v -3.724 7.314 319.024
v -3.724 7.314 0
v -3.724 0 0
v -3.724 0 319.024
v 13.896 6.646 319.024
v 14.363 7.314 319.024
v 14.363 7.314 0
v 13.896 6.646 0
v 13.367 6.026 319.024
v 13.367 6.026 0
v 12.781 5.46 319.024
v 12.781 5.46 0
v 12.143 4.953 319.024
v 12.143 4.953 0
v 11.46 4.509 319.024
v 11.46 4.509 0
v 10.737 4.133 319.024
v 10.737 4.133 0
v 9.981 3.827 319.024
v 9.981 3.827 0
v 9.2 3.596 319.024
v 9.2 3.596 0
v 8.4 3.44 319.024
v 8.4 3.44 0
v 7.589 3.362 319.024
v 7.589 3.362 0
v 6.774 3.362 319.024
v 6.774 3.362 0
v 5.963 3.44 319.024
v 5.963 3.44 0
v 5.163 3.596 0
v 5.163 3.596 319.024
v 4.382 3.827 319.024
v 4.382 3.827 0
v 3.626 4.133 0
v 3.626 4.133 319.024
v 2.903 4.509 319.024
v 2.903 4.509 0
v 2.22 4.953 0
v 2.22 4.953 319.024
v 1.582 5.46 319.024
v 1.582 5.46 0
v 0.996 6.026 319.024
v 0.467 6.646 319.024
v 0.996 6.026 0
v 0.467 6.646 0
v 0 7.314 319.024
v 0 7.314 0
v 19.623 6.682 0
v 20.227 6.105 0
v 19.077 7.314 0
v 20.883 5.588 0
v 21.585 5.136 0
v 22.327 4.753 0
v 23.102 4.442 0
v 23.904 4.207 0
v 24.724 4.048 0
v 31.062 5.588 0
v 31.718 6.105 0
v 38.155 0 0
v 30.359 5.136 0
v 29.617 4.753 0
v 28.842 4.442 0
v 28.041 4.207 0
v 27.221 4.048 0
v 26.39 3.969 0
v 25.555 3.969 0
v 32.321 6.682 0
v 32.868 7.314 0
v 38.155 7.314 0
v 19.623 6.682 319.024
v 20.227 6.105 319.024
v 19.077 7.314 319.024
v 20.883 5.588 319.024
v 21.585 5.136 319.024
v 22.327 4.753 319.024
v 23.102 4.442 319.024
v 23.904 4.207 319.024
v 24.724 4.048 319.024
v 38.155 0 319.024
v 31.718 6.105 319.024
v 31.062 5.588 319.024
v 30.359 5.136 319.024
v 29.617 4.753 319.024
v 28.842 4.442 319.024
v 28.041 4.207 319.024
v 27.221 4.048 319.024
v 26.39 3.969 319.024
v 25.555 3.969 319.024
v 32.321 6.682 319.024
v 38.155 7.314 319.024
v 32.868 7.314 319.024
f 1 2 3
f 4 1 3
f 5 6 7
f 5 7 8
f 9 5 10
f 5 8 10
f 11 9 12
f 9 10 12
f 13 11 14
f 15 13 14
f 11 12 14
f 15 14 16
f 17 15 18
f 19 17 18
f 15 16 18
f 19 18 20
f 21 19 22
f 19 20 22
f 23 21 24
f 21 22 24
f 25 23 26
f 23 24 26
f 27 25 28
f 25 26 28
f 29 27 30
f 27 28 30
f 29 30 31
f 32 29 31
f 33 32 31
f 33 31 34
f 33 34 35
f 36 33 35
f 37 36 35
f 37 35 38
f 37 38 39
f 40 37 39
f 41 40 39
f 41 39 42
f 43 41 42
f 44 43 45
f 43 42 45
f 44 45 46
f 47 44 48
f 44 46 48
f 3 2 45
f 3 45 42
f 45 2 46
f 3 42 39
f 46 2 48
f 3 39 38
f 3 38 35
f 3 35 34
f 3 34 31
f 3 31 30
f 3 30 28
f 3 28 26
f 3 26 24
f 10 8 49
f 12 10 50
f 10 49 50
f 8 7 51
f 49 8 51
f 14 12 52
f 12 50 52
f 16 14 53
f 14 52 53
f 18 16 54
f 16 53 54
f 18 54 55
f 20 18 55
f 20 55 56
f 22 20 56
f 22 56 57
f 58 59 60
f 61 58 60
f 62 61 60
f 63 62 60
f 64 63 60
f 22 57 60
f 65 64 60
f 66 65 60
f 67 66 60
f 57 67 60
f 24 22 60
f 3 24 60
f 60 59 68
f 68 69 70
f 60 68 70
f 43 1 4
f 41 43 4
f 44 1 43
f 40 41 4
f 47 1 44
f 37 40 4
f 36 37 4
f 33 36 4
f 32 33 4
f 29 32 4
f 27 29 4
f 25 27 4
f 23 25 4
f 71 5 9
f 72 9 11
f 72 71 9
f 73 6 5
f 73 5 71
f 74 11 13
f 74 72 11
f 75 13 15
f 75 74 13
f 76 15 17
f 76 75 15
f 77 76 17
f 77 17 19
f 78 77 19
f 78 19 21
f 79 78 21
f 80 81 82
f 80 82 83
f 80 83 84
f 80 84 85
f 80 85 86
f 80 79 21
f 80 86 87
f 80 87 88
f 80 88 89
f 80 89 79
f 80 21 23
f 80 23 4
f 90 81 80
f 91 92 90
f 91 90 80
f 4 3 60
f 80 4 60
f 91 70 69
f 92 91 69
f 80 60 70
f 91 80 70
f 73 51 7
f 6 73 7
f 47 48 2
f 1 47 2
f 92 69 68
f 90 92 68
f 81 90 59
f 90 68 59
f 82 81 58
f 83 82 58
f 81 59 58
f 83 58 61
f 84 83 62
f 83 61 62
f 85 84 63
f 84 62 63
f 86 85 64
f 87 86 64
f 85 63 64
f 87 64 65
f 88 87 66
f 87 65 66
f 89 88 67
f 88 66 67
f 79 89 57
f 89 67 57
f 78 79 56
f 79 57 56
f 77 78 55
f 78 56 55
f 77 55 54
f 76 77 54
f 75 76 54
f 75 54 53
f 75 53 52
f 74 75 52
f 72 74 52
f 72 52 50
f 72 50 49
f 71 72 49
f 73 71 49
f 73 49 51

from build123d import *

# Parameters (mm, degrees)
F1_DEPTH = 319.024


with BuildPart() as f1:
    # F0 (on Top) → F1 (new body)
    with BuildSketch(Plane.XY):
        with BuildLine():
            Line((-3.723805, 0), (0, 0))
            Line((0, 0), (38.15455, 0))
            Line((38.15455, 0), (38.15455, 7.313689))
            Line((38.15455, 7.313689), (32.867547, 7.313689))
            ThreePointArc((32.867547, 7.313689), (25.972411, 3.959021), (19.077275, 7.313689))
            Line((19.077275, 7.313689), (14.36303, 7.313689))
            ThreePointArc((14.36303, 7.313689), (7.181515, 3.352431), (0, 7.313689))
            Line((0, 7.313689), (-3.723805, 7.313689))
            Line((-3.723805, 7.313689), (-3.723805, 0))
        make_face()
    extrude(amount=F1_DEPTH)


solid = f1.part
